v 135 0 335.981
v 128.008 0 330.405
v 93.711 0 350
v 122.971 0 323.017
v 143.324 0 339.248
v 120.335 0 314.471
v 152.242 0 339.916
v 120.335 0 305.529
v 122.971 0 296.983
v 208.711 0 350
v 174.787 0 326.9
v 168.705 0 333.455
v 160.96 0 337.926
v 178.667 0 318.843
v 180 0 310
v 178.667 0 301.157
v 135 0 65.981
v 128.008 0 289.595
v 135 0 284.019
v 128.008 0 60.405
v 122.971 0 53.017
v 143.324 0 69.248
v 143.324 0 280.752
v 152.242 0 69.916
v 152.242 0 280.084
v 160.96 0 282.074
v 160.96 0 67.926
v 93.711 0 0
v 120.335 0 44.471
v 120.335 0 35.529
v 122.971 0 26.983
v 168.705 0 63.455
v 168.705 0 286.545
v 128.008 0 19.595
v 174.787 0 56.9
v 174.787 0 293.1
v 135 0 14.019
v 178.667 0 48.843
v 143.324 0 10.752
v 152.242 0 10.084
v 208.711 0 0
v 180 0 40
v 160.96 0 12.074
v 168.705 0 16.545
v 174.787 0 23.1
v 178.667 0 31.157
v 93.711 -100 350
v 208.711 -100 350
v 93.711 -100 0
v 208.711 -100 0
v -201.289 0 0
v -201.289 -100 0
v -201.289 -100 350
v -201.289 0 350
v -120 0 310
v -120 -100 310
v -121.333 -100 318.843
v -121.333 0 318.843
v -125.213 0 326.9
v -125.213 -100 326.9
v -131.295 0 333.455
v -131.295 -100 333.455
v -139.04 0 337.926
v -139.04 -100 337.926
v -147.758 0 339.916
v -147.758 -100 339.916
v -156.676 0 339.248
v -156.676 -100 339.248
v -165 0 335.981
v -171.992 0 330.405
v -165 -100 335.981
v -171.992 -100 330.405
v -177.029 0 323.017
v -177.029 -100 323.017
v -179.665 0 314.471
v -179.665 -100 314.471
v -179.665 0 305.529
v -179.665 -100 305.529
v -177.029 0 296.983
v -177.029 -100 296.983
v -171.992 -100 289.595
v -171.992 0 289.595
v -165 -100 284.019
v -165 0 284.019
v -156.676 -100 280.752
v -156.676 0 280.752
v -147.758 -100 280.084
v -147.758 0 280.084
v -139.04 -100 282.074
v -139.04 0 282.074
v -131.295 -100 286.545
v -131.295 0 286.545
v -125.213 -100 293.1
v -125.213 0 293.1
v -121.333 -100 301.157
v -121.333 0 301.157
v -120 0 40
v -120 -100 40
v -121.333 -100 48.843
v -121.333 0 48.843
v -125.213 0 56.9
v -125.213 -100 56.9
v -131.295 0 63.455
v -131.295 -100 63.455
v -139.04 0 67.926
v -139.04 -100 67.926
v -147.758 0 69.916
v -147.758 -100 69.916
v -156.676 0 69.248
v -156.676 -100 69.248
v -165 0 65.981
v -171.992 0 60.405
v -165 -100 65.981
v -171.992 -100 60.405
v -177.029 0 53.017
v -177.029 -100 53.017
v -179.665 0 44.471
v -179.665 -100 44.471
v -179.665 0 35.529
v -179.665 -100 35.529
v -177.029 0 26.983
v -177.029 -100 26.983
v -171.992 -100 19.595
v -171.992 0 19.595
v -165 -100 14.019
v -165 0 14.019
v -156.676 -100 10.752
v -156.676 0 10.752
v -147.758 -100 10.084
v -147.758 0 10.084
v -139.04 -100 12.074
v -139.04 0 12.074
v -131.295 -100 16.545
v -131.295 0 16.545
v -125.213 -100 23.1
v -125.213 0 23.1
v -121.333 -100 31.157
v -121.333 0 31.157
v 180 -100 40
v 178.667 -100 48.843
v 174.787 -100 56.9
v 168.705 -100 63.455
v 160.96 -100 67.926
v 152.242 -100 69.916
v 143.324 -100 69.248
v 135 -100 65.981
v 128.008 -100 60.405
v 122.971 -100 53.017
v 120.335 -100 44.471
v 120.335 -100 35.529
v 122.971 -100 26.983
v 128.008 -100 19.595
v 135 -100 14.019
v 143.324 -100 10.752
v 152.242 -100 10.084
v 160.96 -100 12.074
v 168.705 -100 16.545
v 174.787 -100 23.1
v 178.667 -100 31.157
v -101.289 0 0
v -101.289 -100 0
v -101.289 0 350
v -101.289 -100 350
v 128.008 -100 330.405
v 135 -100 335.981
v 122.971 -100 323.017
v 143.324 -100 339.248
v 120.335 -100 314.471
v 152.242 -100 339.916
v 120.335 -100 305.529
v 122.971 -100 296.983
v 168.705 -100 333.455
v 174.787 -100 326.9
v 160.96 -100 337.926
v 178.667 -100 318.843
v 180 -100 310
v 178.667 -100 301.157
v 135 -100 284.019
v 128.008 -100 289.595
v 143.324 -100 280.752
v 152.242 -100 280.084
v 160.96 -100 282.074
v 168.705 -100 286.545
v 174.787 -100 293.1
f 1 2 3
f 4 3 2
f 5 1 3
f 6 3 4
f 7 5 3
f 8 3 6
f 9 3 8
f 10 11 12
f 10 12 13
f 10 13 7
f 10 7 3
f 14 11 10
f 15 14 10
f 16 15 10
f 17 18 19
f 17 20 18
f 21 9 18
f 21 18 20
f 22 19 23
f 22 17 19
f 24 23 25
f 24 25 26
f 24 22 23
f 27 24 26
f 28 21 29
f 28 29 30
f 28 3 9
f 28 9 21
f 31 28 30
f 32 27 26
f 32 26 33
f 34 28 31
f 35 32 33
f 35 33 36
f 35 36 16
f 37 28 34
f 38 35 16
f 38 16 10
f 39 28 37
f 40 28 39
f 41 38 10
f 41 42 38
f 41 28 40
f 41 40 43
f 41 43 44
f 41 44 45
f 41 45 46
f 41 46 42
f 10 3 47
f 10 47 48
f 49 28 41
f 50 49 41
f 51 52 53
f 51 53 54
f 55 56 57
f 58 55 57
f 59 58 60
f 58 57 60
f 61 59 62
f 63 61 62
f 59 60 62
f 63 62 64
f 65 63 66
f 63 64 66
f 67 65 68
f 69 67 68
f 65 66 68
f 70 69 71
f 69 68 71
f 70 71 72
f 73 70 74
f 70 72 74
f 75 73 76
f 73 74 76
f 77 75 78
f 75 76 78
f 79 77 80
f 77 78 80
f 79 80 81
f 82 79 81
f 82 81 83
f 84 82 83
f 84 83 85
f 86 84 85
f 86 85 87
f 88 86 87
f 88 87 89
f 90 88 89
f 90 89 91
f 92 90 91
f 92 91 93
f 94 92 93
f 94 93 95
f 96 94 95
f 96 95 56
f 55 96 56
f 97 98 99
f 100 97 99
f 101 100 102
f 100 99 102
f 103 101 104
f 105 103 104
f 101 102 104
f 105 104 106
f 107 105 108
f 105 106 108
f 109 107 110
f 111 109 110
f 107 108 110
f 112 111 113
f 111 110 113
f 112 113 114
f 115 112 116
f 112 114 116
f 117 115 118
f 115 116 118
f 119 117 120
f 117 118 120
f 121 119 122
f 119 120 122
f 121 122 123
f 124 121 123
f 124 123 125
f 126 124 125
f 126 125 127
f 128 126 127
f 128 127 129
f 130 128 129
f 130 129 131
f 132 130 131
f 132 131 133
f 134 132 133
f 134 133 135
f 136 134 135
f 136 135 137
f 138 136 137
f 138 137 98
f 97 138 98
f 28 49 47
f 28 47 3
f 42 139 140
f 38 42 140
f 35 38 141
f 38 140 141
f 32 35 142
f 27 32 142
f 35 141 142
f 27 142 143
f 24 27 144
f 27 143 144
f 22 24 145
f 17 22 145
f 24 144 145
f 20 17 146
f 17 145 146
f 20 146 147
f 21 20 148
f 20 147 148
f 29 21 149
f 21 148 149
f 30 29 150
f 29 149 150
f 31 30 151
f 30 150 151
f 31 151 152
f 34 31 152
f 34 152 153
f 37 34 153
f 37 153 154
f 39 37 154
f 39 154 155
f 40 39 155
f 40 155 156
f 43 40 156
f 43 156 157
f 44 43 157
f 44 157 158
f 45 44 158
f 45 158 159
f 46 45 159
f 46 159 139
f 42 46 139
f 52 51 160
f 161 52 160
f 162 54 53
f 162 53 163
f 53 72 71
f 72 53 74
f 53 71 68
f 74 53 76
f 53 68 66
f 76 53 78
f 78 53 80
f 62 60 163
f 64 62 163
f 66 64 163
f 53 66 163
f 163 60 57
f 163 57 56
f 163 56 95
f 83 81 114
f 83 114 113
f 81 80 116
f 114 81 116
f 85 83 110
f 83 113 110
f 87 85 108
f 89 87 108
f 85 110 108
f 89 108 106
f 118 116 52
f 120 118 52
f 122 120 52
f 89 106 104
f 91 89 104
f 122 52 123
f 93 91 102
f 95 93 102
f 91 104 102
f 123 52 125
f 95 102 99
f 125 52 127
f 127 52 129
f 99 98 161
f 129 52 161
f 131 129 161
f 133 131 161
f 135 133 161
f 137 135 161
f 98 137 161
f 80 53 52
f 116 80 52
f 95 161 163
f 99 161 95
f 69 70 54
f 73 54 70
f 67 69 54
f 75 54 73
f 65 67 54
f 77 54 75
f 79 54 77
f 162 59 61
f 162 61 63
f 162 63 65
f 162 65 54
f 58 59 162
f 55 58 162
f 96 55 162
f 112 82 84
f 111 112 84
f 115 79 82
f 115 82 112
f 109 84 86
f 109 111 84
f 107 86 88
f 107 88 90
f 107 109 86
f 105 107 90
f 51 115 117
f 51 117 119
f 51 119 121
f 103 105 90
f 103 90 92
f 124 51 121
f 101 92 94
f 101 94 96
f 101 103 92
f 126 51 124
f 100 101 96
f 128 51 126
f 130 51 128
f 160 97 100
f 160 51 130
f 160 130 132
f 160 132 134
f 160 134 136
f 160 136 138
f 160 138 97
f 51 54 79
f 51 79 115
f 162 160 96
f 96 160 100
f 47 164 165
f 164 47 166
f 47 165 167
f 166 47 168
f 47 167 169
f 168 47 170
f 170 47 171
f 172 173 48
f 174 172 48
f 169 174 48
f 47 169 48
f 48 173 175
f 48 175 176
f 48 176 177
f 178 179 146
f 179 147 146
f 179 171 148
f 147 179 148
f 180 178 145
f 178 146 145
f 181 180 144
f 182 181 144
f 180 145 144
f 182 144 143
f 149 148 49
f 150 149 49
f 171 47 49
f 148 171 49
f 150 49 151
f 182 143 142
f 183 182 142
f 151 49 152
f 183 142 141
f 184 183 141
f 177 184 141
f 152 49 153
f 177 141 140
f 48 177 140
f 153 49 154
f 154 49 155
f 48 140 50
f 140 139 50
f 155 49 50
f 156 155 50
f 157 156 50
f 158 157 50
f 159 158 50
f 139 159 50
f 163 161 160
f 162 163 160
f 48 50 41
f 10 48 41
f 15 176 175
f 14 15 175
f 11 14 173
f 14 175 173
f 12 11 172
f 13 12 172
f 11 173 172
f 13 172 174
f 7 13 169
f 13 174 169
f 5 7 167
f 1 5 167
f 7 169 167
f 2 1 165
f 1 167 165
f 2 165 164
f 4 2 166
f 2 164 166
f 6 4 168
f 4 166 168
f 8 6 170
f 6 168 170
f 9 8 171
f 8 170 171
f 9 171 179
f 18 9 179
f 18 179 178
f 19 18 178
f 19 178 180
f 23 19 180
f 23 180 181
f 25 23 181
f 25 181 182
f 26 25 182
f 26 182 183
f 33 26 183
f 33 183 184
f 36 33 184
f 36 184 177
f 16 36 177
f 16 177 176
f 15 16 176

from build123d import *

# Parameters (mm, degrees)
F0_W     = 100
F0_H     = 100
F0_W_2   = 114.999997
F1_DEPTH = 350
F2_R     = 30
F3_DEPTH = 200
F4_R     = 30
F5_DEPTH = 200
F6_R     = 30
F7_DEPTH = 200
F8_R     = 30
F9_DEPTH = 200


with BuildPart() as f1:
    # F0 (on Top) → F1 (new body)
    with BuildSketch(Plane.XY):
        with Locations((-151.289394, -50)):
            Rectangle(F0_W, F0_H)
        with Locations((151.210569, -50)):
            Rectangle(F0_W_2, F0_H)
    extrude(amount=F1_DEPTH)

    # F2 (on face) → F3 (cut)
    with BuildSketch(Plane.XZ.offset(100)):
        with Locations((-150, 310)):
            Circle(F2_R)
    extrude(amount=-F3_DEPTH, mode=Mode.SUBTRACT)

    # F4 (on face) → F5 (cut)
    with BuildSketch(Plane.XZ.offset(100)):
        with Locations((150, 310)):
            Circle(F4_R)
    extrude(amount=-F5_DEPTH, mode=Mode.SUBTRACT)

    # F6 (on face) → F7 (cut)
    with BuildSketch(Plane.XZ.offset(100)):
        with Locations((-150, 40)):
            Circle(F6_R)
    extrude(amount=-F7_DEPTH, mode=Mode.SUBTRACT)

    # F8 (on face) → F9 (cut)
    with BuildSketch(Plane.XZ.offset(100)):
        with Locations((150, 40)):
            Circle(F8_R)
    extrude(amount=-F9_DEPTH, mode=Mode.SUBTRACT)


solid = f1.part
